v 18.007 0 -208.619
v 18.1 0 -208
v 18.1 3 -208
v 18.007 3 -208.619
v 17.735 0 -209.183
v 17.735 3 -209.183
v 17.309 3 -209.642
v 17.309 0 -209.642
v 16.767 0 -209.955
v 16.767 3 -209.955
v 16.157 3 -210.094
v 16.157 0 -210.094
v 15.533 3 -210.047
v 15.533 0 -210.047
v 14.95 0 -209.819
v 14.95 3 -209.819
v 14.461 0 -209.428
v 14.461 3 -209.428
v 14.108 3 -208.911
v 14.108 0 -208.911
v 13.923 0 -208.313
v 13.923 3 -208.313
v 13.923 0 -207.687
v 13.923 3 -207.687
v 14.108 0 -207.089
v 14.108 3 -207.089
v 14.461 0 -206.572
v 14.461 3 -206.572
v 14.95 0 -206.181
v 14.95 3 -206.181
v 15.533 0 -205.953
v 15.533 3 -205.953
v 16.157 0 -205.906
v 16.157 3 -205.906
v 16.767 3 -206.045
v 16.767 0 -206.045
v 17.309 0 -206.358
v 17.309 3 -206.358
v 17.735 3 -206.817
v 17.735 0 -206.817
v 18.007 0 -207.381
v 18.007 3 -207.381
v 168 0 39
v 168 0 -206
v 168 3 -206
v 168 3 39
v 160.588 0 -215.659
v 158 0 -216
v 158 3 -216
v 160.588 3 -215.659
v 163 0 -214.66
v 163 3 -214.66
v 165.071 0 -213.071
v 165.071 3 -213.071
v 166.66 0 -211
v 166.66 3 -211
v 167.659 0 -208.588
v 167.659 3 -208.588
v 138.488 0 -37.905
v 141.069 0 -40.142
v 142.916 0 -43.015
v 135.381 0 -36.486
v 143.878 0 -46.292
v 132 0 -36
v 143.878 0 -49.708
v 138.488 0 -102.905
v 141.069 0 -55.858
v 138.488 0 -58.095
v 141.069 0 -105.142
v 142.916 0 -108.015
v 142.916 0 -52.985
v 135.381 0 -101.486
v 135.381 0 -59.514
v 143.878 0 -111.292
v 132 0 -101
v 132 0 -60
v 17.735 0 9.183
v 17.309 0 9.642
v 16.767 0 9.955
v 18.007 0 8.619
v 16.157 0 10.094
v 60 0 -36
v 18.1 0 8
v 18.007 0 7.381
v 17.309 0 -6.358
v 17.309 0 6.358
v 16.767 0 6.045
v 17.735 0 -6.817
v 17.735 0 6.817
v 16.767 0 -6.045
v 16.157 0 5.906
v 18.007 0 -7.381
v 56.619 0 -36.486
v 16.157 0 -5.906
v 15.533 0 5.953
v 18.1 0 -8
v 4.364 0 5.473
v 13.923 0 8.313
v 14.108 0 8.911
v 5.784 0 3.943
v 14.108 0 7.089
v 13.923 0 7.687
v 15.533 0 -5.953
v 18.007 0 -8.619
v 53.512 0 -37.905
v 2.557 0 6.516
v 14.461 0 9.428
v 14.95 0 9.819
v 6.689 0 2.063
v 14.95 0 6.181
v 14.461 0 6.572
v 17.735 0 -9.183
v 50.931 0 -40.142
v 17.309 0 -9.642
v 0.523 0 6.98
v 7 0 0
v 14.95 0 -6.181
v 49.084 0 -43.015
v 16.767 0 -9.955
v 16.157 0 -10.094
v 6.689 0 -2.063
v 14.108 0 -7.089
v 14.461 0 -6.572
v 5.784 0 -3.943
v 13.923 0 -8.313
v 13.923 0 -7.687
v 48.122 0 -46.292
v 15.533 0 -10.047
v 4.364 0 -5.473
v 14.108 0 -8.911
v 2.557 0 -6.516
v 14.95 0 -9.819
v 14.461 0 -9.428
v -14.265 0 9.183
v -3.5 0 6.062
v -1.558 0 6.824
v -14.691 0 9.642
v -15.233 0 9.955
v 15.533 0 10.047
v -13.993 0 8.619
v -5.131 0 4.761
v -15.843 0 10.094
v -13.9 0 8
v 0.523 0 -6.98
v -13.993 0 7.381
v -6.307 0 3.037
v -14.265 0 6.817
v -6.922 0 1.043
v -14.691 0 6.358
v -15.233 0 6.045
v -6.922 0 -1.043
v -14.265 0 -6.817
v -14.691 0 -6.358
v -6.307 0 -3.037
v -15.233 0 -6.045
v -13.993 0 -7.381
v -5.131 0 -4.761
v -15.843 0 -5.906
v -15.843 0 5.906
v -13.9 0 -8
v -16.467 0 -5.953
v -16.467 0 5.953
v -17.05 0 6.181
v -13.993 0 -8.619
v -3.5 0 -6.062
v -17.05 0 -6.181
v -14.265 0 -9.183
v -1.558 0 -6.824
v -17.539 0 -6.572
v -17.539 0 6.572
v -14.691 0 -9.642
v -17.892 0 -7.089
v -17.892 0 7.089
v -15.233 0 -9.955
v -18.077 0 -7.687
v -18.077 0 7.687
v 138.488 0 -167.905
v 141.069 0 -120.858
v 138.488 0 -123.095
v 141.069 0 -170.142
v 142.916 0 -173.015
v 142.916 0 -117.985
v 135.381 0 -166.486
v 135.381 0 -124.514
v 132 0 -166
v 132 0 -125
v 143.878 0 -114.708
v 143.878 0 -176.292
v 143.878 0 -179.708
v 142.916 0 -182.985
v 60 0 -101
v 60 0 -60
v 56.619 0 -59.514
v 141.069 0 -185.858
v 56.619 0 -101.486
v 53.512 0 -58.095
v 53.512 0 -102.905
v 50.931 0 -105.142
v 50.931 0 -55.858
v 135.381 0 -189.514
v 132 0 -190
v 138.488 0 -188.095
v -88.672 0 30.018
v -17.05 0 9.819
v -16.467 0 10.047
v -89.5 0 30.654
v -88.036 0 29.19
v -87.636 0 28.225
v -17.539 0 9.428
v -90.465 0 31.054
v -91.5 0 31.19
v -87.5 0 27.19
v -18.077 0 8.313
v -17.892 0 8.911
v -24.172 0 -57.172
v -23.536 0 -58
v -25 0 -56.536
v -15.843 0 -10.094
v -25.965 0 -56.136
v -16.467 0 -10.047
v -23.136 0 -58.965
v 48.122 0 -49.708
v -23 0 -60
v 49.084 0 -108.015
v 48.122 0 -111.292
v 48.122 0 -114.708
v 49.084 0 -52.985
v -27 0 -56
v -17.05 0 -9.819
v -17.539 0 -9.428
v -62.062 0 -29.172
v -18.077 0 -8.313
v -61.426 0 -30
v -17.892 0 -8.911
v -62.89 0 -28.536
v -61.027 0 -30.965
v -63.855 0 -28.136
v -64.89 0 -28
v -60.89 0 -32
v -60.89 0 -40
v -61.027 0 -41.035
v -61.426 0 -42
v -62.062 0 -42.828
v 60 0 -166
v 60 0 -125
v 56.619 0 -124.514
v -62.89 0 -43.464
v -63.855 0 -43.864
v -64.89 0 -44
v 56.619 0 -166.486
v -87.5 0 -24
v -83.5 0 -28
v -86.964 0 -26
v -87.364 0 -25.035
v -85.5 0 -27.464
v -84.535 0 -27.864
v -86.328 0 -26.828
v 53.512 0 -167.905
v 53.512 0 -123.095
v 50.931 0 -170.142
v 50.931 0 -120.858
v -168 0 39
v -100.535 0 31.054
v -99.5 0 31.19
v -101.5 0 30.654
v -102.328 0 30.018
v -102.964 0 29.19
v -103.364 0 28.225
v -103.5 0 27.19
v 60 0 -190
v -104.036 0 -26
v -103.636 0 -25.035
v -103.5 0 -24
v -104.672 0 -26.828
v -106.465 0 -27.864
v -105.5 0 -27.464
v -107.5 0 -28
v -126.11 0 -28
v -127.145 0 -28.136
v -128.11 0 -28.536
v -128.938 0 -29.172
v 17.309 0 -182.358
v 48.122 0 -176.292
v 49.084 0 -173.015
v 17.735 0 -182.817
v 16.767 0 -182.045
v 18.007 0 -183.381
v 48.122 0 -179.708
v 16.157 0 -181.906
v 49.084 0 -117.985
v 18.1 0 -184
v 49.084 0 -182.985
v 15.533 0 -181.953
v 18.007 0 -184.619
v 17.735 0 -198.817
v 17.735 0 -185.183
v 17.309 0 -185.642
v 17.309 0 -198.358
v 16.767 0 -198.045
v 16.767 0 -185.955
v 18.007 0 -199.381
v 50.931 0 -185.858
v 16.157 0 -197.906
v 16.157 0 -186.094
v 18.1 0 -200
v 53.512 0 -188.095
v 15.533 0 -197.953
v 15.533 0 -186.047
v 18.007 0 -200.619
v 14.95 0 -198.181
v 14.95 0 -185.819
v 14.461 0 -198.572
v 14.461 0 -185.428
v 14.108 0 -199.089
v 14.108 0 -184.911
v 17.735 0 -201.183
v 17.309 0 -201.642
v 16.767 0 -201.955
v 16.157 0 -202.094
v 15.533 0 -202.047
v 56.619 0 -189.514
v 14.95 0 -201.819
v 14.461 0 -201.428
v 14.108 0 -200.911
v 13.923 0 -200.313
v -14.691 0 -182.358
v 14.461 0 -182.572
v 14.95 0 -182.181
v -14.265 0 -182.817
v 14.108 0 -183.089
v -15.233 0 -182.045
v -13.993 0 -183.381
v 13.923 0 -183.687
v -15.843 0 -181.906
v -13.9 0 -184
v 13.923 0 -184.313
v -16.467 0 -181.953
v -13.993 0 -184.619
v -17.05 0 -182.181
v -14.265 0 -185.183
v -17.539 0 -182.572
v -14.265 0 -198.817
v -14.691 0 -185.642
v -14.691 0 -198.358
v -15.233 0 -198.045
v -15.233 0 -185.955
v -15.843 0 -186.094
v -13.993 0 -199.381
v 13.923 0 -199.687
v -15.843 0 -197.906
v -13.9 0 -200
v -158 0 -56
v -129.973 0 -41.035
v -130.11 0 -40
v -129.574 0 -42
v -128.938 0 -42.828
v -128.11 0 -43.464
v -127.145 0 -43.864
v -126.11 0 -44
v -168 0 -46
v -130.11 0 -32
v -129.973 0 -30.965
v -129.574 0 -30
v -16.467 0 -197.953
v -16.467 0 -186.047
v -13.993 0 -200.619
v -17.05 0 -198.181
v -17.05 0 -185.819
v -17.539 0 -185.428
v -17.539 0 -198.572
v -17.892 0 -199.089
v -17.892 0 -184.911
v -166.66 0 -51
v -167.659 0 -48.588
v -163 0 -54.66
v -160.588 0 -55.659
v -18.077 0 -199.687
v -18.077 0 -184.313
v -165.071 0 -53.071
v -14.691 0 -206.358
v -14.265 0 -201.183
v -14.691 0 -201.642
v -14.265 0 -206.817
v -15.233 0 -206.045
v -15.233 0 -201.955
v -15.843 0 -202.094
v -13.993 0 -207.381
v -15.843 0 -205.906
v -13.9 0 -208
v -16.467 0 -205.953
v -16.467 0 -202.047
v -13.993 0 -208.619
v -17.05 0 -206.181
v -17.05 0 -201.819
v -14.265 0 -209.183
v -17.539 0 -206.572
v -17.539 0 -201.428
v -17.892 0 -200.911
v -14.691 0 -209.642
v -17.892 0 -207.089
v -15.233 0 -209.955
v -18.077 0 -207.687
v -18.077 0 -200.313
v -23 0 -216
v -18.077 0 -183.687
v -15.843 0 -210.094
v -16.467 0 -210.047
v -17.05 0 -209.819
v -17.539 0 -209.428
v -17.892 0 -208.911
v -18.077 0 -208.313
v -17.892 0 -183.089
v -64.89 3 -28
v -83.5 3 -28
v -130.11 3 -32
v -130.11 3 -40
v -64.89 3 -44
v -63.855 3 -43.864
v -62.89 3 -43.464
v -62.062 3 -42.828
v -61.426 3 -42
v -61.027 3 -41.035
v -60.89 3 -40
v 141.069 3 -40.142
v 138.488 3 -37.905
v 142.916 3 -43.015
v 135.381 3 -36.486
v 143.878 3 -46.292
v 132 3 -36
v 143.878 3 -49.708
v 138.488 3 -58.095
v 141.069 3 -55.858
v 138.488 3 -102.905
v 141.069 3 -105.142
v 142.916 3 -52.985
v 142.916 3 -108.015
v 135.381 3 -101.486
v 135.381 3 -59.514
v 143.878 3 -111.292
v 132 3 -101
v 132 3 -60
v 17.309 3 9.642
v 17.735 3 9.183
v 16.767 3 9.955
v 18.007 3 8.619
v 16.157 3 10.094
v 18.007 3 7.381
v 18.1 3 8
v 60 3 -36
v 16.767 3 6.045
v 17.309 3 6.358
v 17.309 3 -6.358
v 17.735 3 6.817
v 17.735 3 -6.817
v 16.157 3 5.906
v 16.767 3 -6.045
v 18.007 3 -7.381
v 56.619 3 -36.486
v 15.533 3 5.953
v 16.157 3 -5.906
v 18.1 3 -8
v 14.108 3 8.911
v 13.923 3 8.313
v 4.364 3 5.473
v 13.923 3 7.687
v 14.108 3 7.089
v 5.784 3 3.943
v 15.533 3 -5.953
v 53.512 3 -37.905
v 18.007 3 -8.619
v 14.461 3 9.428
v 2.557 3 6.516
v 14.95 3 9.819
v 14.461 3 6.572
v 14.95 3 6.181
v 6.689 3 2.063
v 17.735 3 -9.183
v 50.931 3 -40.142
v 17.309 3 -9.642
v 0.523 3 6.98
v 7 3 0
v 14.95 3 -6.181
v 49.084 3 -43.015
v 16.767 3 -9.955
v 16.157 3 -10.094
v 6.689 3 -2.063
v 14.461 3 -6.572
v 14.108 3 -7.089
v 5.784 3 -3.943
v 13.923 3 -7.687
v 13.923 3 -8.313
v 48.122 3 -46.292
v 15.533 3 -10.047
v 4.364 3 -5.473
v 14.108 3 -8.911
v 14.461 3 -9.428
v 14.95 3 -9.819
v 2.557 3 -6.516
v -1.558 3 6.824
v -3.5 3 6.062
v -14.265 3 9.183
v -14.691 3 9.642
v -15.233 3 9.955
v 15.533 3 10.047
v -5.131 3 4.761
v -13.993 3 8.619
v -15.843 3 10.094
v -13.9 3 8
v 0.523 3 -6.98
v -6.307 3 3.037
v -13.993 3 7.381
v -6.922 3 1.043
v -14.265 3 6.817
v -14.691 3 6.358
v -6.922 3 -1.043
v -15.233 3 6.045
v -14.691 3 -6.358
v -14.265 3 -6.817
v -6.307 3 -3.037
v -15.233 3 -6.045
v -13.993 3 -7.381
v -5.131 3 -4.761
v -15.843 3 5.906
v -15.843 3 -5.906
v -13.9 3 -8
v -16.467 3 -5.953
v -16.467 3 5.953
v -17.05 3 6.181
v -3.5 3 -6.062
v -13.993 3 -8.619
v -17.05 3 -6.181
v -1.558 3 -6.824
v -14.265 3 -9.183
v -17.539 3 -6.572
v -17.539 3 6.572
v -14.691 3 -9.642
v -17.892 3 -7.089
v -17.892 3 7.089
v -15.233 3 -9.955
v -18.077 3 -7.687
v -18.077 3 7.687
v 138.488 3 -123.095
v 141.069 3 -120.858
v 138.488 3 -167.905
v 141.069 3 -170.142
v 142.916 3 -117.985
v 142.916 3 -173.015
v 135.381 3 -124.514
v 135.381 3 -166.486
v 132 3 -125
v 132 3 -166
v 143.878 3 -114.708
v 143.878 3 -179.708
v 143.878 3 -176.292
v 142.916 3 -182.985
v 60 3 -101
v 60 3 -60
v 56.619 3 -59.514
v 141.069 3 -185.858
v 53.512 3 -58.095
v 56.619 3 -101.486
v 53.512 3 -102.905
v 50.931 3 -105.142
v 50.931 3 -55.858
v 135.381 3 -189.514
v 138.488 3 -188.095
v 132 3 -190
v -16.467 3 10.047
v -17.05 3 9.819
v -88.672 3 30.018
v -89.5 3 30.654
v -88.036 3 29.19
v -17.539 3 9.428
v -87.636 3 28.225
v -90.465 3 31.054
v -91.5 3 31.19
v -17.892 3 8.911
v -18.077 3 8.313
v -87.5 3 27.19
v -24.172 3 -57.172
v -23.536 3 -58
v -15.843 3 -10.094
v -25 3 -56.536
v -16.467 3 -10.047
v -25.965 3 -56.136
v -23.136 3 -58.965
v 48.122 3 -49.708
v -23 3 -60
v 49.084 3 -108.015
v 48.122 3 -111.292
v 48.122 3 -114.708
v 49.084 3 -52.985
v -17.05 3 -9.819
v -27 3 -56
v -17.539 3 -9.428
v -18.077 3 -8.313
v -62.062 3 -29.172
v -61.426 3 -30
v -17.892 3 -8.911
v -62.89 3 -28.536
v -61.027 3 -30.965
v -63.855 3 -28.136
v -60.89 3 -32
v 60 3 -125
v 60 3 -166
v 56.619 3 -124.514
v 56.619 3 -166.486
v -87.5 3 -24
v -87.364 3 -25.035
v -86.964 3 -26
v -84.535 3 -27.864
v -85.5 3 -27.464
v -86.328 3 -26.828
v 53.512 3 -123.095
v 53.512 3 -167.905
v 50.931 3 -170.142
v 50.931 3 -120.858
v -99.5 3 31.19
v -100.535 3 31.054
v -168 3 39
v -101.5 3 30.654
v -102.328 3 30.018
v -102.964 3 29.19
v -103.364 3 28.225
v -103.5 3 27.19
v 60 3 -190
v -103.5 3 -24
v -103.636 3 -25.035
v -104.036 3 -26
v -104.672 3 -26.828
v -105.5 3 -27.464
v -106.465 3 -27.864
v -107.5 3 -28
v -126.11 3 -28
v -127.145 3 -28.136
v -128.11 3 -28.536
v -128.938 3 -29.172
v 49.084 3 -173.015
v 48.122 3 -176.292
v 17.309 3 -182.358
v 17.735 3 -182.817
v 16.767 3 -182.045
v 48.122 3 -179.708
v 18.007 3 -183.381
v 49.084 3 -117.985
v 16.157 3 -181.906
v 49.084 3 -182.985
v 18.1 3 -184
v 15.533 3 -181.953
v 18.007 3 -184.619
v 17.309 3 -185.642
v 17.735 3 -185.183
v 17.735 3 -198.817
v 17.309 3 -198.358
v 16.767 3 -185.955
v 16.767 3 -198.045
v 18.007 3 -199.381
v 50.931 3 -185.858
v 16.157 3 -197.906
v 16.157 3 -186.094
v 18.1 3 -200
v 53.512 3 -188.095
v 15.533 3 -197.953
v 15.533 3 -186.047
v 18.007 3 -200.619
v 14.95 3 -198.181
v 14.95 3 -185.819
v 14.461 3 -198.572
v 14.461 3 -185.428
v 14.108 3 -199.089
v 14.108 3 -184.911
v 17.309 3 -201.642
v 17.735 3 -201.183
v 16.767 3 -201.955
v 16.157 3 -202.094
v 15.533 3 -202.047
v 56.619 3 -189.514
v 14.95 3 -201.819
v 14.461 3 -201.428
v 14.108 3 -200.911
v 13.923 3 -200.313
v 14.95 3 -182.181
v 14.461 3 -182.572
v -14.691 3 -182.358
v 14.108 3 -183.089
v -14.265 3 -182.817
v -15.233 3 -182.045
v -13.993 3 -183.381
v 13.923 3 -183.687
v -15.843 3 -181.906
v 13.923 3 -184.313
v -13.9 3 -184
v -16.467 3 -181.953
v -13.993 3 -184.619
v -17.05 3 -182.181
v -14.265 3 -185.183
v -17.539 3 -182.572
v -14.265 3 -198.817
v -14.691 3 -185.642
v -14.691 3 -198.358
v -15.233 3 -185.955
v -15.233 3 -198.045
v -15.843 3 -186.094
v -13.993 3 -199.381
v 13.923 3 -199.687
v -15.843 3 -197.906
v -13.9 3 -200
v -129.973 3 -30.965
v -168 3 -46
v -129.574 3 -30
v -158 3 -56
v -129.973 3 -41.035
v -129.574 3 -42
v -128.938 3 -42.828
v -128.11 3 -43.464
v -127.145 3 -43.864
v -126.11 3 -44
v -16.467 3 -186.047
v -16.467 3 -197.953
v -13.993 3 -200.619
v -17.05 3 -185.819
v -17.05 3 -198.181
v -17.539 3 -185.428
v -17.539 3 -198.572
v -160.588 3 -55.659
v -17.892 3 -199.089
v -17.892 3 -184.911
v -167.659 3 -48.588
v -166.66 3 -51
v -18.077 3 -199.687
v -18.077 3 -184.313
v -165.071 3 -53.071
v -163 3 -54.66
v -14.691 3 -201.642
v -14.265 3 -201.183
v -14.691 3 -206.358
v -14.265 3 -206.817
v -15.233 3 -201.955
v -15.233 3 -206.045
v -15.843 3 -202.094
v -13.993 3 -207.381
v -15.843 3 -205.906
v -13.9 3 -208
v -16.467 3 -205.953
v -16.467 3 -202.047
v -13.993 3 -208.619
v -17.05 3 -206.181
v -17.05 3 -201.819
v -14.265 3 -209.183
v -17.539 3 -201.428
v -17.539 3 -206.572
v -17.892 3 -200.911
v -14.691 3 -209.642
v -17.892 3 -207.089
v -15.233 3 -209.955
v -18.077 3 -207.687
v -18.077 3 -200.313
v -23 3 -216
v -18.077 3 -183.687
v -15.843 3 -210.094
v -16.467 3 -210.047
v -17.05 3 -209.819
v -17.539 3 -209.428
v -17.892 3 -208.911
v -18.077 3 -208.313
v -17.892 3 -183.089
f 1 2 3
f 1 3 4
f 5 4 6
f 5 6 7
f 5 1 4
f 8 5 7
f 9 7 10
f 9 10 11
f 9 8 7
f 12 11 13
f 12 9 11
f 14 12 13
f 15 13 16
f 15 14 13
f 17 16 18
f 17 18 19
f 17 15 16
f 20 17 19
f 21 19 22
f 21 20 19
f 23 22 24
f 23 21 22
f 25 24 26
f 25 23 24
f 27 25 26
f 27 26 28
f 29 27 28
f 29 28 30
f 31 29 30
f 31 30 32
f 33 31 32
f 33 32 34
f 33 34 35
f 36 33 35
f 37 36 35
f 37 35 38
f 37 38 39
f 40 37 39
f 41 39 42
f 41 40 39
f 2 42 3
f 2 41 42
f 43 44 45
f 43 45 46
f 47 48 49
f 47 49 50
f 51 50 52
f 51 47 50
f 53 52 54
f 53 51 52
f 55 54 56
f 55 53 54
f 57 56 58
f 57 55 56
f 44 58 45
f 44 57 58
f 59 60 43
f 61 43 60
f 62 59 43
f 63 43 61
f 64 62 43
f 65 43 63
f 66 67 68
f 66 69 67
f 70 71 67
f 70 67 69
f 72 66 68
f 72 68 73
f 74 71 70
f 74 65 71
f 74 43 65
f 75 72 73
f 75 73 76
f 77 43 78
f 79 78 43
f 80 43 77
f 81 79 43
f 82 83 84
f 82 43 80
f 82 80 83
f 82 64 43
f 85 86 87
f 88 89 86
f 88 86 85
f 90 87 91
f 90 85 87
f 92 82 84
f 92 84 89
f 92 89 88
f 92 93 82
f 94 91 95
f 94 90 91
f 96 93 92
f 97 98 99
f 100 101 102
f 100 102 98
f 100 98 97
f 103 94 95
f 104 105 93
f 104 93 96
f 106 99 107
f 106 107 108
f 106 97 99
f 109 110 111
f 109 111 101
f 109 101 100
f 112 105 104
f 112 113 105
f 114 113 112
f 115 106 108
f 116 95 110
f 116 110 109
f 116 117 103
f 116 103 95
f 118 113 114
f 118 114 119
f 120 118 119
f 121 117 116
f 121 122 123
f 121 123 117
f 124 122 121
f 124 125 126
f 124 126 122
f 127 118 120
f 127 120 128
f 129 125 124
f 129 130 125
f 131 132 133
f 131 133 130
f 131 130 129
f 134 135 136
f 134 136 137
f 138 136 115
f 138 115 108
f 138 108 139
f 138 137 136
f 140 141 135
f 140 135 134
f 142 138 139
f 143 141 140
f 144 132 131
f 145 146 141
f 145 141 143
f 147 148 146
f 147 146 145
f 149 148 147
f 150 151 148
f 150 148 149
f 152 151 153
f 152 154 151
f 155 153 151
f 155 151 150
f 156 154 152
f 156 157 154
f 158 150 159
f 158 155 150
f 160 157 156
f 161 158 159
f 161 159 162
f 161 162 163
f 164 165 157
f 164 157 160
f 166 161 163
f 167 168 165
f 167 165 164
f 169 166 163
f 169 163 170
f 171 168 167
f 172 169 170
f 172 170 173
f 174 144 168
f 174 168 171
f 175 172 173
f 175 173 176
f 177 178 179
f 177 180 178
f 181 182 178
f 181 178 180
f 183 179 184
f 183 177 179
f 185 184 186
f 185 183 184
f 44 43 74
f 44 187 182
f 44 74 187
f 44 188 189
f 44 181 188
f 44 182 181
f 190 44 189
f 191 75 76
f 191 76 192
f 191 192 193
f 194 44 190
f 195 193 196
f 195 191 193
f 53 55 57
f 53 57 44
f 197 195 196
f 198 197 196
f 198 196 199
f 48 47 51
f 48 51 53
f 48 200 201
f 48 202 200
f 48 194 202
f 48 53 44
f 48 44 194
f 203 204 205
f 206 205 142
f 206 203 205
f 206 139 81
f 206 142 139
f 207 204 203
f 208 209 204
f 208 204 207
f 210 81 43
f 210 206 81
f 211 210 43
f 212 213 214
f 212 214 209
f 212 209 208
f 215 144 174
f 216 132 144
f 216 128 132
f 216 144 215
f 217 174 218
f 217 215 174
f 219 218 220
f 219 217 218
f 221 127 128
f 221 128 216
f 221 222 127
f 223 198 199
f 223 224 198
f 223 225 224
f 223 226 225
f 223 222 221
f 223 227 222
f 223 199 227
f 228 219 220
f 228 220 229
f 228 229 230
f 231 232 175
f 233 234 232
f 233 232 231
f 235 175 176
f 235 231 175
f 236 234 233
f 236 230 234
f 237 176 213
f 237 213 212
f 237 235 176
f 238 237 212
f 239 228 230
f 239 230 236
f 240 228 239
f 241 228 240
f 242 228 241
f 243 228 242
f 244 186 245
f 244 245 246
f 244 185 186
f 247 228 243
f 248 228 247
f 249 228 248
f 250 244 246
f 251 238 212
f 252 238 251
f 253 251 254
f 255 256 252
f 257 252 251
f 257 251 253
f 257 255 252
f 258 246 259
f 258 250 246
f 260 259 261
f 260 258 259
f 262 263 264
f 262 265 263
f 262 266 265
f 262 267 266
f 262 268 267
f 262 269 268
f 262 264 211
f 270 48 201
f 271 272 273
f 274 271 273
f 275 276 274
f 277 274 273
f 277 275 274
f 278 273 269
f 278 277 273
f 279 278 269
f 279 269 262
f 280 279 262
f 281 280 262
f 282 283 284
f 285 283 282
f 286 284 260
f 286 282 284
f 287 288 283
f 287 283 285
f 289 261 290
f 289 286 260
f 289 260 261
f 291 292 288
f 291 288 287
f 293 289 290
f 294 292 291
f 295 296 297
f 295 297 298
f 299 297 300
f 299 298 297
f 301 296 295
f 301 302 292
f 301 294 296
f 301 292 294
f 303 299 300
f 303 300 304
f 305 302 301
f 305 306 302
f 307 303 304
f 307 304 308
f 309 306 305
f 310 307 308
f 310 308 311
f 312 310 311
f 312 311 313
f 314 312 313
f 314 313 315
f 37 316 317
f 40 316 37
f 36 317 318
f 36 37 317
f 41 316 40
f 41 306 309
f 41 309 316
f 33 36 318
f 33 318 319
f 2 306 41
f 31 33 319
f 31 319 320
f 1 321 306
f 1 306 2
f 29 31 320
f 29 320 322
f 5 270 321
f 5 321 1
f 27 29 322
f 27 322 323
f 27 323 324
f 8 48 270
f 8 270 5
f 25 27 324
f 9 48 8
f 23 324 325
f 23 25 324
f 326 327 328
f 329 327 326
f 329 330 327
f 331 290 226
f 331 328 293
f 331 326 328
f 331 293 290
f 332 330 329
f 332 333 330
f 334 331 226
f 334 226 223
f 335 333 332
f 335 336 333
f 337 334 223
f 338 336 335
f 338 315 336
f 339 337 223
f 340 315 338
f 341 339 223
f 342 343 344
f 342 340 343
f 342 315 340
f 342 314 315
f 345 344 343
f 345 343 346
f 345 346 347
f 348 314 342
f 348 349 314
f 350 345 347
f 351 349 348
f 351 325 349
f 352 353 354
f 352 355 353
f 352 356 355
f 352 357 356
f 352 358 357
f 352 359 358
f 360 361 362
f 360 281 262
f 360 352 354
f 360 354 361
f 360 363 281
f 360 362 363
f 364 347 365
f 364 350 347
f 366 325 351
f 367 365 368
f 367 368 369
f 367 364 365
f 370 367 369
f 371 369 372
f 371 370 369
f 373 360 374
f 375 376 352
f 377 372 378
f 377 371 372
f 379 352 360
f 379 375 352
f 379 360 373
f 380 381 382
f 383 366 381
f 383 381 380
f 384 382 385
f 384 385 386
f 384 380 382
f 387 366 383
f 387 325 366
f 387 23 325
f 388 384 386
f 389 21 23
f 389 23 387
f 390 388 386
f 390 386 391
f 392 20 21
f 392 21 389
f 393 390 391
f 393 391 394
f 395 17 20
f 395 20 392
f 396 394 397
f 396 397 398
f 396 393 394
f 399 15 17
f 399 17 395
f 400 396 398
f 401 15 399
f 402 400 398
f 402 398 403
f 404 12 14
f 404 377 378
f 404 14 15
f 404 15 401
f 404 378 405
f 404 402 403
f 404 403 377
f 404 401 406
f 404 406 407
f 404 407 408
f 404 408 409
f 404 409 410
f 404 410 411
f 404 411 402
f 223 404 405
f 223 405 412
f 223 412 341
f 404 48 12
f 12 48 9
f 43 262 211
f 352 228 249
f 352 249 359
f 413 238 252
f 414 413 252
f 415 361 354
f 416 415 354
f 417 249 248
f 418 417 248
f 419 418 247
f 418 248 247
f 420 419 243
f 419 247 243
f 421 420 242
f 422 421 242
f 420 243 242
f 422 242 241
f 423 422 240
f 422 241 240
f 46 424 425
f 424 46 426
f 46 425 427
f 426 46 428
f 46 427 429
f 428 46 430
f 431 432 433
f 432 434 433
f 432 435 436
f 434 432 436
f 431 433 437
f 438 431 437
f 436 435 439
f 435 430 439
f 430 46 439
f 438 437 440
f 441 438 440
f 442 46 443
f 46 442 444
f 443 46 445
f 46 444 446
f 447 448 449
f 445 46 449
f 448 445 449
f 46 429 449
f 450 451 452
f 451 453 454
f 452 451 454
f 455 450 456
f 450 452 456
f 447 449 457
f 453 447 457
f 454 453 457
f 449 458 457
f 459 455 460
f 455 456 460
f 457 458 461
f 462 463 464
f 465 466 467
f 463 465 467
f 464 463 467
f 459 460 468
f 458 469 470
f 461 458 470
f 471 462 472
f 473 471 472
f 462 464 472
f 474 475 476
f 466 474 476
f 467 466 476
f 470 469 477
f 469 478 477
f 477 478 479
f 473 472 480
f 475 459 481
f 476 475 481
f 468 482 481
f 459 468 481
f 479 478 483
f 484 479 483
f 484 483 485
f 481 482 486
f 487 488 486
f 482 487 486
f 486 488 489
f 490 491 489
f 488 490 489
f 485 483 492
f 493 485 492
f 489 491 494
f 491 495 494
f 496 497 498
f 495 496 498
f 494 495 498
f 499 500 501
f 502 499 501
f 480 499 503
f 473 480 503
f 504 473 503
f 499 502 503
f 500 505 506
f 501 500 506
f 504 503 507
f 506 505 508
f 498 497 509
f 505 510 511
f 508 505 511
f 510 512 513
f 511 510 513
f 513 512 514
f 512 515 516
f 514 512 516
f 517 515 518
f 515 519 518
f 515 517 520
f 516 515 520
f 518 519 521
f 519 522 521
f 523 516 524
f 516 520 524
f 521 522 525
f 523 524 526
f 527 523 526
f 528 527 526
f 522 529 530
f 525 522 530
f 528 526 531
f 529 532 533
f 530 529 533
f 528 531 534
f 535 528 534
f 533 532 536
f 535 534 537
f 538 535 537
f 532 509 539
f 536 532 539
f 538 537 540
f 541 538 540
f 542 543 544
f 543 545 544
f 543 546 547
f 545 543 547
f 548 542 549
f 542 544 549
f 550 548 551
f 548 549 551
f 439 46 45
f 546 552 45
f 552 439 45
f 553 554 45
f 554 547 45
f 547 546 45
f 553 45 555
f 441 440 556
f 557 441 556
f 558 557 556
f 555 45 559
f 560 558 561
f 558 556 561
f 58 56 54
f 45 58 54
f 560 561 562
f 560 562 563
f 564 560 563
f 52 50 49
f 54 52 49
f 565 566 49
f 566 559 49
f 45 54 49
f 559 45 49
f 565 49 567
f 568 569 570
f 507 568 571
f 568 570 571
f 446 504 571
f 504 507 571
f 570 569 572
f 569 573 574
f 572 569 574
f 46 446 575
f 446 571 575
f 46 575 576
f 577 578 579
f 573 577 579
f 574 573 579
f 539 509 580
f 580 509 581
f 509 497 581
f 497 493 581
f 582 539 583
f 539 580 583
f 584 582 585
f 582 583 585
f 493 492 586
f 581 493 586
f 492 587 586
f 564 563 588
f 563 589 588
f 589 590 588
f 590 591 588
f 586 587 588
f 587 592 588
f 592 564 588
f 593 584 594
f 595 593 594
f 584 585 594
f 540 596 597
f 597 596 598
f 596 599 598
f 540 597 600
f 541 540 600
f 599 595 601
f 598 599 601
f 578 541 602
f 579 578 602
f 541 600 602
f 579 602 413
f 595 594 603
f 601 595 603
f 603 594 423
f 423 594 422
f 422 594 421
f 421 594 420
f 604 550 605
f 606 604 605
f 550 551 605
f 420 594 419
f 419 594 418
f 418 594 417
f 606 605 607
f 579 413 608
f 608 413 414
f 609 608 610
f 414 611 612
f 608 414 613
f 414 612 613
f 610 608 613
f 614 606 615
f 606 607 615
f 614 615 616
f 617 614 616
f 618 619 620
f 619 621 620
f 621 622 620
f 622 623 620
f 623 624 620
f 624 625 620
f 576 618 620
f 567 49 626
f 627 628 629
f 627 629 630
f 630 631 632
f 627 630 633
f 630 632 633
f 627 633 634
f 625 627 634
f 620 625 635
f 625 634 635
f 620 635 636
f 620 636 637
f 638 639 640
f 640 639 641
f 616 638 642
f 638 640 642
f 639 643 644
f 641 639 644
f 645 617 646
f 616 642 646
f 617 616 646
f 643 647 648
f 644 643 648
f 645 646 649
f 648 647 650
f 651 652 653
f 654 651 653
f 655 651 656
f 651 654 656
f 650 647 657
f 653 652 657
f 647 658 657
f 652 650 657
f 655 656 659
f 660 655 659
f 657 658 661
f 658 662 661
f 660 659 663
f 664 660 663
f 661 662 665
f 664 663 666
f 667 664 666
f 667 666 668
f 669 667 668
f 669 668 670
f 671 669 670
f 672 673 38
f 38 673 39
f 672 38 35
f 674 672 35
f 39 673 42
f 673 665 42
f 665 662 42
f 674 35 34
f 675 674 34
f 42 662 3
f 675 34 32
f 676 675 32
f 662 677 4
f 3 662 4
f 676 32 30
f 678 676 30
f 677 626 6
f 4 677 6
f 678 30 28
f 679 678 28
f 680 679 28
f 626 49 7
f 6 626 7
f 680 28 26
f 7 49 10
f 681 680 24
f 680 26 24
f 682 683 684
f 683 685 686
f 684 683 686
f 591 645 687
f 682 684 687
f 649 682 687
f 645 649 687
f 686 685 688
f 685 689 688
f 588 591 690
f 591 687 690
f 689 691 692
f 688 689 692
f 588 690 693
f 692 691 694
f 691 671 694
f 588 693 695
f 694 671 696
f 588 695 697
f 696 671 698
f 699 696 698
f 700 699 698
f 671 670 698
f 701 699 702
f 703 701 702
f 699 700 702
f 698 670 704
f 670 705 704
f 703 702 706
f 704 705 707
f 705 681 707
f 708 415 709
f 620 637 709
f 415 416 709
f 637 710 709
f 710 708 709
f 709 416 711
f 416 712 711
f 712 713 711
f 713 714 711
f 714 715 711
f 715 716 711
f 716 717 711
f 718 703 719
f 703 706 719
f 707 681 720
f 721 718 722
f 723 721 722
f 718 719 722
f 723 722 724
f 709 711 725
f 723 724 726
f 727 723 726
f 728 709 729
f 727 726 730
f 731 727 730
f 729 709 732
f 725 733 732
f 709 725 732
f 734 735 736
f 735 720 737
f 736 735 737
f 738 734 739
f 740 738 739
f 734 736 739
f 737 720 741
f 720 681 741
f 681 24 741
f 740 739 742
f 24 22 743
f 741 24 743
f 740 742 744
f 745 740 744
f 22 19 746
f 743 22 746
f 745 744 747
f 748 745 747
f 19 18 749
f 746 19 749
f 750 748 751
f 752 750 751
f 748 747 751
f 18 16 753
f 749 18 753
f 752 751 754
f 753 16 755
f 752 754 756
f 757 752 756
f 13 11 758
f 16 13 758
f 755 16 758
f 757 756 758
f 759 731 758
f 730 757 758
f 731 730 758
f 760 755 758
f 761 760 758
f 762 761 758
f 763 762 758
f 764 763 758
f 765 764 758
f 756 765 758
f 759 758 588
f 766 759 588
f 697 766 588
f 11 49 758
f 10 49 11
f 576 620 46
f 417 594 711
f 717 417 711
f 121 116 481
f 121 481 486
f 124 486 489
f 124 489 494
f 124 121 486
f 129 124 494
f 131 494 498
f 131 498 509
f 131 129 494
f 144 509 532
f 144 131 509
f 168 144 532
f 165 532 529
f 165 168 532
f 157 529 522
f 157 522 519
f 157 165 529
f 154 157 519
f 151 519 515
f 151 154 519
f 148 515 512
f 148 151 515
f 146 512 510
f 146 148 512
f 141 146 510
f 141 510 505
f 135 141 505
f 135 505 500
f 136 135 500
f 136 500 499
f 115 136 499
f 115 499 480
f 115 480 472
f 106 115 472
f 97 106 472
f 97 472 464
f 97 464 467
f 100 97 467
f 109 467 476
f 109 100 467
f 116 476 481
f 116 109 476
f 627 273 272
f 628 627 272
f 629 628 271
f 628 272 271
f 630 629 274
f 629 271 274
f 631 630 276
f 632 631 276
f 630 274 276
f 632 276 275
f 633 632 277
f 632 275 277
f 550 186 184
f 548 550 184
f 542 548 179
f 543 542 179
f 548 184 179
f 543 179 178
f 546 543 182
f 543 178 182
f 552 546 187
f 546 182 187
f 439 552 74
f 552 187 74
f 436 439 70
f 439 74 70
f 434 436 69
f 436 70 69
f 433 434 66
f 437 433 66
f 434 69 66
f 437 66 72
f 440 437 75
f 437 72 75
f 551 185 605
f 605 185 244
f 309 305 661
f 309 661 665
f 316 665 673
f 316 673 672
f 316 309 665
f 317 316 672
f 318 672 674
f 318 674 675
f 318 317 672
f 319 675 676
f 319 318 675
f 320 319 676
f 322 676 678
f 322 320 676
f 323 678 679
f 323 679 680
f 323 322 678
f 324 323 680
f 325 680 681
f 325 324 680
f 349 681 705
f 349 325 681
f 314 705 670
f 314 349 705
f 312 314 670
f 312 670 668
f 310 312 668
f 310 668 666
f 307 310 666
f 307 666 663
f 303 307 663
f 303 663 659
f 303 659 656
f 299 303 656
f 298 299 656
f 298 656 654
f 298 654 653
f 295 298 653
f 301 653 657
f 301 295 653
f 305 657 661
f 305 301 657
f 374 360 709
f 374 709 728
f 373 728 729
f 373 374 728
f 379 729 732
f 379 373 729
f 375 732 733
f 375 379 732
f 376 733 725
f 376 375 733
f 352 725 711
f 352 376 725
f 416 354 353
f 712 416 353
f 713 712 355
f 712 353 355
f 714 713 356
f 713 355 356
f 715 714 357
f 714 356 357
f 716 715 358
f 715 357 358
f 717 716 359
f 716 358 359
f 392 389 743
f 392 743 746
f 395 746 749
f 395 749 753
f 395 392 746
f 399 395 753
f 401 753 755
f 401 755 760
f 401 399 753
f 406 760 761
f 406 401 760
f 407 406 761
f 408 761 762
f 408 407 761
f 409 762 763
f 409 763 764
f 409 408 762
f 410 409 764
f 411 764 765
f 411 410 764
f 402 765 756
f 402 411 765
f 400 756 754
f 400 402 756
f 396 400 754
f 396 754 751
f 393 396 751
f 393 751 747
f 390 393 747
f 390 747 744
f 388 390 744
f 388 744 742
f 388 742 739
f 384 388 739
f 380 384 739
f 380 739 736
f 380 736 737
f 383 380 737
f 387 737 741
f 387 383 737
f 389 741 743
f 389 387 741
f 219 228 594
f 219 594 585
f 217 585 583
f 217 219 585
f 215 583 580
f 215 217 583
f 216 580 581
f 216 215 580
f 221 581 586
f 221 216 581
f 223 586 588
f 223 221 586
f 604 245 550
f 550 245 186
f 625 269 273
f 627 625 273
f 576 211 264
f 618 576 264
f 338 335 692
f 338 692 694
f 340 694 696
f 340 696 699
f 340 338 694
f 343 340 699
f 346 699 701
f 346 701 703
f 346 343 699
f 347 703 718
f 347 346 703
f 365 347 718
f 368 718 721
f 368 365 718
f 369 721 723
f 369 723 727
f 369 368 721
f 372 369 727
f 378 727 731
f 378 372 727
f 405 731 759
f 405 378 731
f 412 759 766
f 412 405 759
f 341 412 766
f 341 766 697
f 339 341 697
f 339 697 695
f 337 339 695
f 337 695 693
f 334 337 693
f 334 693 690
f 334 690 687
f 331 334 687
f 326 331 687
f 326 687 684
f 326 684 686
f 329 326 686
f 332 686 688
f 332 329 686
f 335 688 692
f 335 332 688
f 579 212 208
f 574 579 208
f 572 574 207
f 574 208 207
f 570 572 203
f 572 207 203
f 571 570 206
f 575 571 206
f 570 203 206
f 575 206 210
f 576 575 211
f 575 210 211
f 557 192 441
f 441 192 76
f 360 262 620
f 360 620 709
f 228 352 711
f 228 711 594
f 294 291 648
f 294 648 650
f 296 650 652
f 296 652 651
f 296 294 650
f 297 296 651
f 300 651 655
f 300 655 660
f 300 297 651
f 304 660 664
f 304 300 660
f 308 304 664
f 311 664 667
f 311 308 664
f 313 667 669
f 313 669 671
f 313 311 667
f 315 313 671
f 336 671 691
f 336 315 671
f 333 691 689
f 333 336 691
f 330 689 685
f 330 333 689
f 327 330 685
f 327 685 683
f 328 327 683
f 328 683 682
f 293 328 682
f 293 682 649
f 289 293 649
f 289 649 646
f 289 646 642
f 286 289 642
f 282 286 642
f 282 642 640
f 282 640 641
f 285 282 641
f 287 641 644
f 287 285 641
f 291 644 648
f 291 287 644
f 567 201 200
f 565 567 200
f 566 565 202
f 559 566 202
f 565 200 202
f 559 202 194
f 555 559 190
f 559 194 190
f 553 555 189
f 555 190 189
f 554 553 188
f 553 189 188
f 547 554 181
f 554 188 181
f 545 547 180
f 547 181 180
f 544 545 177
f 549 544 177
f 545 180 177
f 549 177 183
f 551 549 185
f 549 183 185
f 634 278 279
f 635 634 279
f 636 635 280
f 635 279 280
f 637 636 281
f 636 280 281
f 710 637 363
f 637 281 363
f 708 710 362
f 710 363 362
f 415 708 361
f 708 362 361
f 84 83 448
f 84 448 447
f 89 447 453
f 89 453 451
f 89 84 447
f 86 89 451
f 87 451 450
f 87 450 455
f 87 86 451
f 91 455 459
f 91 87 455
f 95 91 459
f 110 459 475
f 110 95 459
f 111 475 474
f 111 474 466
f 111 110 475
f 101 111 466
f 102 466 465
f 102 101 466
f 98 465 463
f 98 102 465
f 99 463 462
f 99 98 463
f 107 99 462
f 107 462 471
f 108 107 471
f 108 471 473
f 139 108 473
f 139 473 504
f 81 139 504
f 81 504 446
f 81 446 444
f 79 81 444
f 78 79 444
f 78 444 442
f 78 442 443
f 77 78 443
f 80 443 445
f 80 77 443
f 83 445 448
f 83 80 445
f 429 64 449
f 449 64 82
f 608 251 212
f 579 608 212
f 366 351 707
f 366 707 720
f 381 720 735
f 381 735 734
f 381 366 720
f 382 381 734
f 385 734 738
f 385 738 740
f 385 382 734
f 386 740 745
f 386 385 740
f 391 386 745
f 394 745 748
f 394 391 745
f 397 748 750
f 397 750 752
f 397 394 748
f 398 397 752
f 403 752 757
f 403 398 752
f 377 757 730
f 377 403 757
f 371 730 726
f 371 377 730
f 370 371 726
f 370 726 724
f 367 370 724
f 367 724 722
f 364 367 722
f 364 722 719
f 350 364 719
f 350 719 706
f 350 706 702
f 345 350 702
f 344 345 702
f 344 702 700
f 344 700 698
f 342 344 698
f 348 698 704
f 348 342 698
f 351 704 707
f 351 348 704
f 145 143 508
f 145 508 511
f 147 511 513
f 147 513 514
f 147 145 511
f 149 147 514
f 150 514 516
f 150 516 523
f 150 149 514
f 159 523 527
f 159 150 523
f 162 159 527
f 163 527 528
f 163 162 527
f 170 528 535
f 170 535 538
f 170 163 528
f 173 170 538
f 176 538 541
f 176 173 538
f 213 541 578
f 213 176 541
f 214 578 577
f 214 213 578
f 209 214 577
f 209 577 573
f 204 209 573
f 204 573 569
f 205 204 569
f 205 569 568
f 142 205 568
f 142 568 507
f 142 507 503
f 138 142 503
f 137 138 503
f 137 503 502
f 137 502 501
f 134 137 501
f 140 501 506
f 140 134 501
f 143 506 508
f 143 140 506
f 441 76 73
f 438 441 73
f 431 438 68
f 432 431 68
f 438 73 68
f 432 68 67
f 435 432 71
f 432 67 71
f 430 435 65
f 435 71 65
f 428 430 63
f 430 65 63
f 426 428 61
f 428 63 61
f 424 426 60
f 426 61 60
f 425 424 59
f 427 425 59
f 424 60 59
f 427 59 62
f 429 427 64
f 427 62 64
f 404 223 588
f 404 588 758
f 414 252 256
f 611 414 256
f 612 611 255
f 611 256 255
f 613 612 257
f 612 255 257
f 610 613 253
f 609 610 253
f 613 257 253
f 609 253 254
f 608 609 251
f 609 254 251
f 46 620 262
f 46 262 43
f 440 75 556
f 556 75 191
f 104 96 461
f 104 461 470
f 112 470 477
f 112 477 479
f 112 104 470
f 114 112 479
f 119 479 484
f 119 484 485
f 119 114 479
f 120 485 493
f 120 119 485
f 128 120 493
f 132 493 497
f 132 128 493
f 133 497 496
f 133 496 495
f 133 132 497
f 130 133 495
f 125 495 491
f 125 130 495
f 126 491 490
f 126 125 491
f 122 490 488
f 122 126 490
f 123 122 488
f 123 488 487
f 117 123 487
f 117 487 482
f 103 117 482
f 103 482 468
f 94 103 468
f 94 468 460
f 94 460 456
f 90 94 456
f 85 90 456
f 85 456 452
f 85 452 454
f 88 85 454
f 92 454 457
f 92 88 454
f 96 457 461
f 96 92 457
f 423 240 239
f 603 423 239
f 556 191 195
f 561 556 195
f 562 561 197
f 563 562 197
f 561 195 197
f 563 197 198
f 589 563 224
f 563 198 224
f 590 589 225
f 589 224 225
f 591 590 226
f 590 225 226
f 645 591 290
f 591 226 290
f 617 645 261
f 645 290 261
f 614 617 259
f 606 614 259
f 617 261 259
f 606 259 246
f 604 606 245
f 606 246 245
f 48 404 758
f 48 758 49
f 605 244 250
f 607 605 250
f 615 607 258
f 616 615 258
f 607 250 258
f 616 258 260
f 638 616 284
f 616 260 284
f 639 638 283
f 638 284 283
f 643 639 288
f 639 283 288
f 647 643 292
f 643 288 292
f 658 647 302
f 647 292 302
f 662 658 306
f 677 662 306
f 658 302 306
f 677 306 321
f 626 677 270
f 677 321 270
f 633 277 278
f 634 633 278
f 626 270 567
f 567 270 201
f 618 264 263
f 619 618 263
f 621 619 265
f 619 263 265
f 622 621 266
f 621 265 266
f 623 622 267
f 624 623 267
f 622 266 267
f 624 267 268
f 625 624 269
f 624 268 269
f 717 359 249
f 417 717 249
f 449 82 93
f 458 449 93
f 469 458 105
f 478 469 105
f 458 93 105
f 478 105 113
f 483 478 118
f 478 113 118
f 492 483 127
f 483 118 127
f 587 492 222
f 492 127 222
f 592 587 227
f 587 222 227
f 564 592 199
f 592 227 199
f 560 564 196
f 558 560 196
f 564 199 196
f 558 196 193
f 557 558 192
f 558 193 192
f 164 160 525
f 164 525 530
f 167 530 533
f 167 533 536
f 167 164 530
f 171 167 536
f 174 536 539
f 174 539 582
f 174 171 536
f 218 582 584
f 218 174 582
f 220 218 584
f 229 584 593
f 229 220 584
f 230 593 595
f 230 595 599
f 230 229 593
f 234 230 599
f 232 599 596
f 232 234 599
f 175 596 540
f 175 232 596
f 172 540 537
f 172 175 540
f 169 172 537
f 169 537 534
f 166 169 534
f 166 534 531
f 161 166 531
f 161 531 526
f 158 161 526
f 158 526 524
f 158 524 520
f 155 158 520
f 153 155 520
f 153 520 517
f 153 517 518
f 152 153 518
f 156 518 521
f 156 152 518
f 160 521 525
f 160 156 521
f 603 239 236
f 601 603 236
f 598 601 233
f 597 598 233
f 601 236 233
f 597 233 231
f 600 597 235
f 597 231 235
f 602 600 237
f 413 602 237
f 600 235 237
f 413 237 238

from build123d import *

# Parameters (mm, degrees)
SKETCH1_R               = 7
SKETCH1_R_2             = 2.1
BOSS_EXTRUDE1_DEPTH     = 3
SKETCH2_W               = 336
SKETCH2_H               = 4
CUT_EXTRUDE1_DEPTH      = 1
CUT_EXTRUDE1_DEPTH_BACK = 4


with BuildPart() as part:
    # Sketch1 → Boss-Extrude1 (new body)
    with BuildSketch(Plane(origin=(0, 0, 0), x_dir=(1, 0, 0), z_dir=(0, 1, 0))):
        with BuildLine():
            Line((-23, 216), (158, 216))
            ThreePointArc((158, 216), (165.071067812, 213.071067812), (168, 206))
            Line((168, 206), (168, -43))
            Line((168, -43), (-168, -43))
            Line((-168, -43), (-168, 46))
            ThreePointArc((-168, 46), (-165.071067812, 53.071067812), (-158, 56))
            Line((-158, 56), (-27, 56))
            ThreePointArc((-27, 56), (-24.171572875, 57.171572875), (-23, 60))
            Line((-23, 60), (-23, 216))
        make_face()
        Circle(SKETCH1_R, mode=Mode.SUBTRACT)
        with Locations((16, 8)):
            Circle(SKETCH1_R_2, mode=Mode.SUBTRACT)
        with Locations((16, -8)):
            Circle(SKETCH1_R_2, mode=Mode.SUBTRACT)
        with Locations((16, 208)):
            Circle(SKETCH1_R_2, mode=Mode.SUBTRACT)
        with Locations((16, 184)):
            Circle(SKETCH1_R_2, mode=Mode.SUBTRACT)
        with Locations((16, 200)):
            Circle(SKETCH1_R_2, mode=Mode.SUBTRACT)
        with Locations((-16, 184)):
            Circle(SKETCH1_R_2, mode=Mode.SUBTRACT)
        with Locations((-16, 200)):
            Circle(SKETCH1_R_2, mode=Mode.SUBTRACT)
        with Locations((-16, 208)):
            Circle(SKETCH1_R_2, mode=Mode.SUBTRACT)
        with Locations((-16, -8)):
            Circle(SKETCH1_R_2, mode=Mode.SUBTRACT)
        with Locations((-16, 8)):
            Circle(SKETCH1_R_2, mode=Mode.SUBTRACT)
        with BuildLine():
            Line((-103.5, -27.189984024), (-103.5, 24))
            ThreePointArc((-103.5, 24), (-104.671572875, 26.828427125), (-107.5, 28))
            Line((-107.5, 28), (-126.109686491, 28))
            ThreePointArc((-126.109686491, 28), (-128.938113615, 29.171572875), (-130.109686491, 32))
            Line((-130.109686491, 32), (-130.109686491, 40))
            ThreePointArc((-130.109686491, 40), (-128.938113615, 42.828427125), (-126.109686491, 44))
            Line((-126.109686491, 44), (-64.890313509, 44))
            ThreePointArc((-64.890313509, 44), (-62.061886385, 42.828427125), (-60.890313509, 40))
            Line((-60.890313509, 40), (-60.890313509, 32))
            ThreePointArc((-60.890313509, 32), (-62.061886385, 29.171572875), (-64.890313509, 28))
            Line((-64.890313509, 28), (-83.5, 28))
            ThreePointArc((-83.5, 28), (-86.328427125, 26.828427125), (-87.5, 24))
            Line((-87.5, 24), (-87.5, -27.189984024))
            ThreePointArc((-87.5, -27.189984024), (-88.671572875, -30.018411149), (-91.5, -31.189984024))
            Line((-91.5, -31.189984024), (-99.5, -31.189984024))
            ThreePointArc((-99.5, -31.189984024), (-102.328427125, -30.018411149), (-103.5, -27.189984024))
        make_face(mode=Mode.SUBTRACT)
        with BuildLine():
            Line((60, 60), (132, 60))
            ThreePointArc((132, 60), (144, 48), (132, 36))
            Line((132, 36), (60, 36))
            ThreePointArc((60, 36), (48, 48), (60, 60))
        make_face(mode=Mode.SUBTRACT)
        with BuildLine():
            Line((60, 125), (132, 125))
            ThreePointArc((132, 125), (144, 113), (132, 101))
            Line((132, 101), (60, 101))
            ThreePointArc((60, 101), (48, 113), (60, 125))
        make_face(mode=Mode.SUBTRACT)
        with BuildLine():
            Line((60, 190), (132, 190))
            ThreePointArc((132, 190), (144, 178), (132, 166))
            Line((132, 166), (60, 166))
            ThreePointArc((60, 166), (48, 178), (60, 190))
        make_face(mode=Mode.SUBTRACT)
    extrude(amount=BOSS_EXTRUDE1_DEPTH)

    # Sketch2 → Cut-Extrude1 (cut, two sides)
    with BuildSketch(Plane(origin=(0, 3, 0), x_dir=(1, 0, 0), z_dir=(0, 1, 0))) as cut_extrude1_sk:
        with Locations((0, -41)):
            Rectangle(SKETCH2_W, SKETCH2_H)
    extrude(amount=CUT_EXTRUDE1_DEPTH, mode=Mode.SUBTRACT)
    extrude(cut_extrude1_sk.sketch, amount=-CUT_EXTRUDE1_DEPTH_BACK, mode=Mode.SUBTRACT)


solid = part.part
